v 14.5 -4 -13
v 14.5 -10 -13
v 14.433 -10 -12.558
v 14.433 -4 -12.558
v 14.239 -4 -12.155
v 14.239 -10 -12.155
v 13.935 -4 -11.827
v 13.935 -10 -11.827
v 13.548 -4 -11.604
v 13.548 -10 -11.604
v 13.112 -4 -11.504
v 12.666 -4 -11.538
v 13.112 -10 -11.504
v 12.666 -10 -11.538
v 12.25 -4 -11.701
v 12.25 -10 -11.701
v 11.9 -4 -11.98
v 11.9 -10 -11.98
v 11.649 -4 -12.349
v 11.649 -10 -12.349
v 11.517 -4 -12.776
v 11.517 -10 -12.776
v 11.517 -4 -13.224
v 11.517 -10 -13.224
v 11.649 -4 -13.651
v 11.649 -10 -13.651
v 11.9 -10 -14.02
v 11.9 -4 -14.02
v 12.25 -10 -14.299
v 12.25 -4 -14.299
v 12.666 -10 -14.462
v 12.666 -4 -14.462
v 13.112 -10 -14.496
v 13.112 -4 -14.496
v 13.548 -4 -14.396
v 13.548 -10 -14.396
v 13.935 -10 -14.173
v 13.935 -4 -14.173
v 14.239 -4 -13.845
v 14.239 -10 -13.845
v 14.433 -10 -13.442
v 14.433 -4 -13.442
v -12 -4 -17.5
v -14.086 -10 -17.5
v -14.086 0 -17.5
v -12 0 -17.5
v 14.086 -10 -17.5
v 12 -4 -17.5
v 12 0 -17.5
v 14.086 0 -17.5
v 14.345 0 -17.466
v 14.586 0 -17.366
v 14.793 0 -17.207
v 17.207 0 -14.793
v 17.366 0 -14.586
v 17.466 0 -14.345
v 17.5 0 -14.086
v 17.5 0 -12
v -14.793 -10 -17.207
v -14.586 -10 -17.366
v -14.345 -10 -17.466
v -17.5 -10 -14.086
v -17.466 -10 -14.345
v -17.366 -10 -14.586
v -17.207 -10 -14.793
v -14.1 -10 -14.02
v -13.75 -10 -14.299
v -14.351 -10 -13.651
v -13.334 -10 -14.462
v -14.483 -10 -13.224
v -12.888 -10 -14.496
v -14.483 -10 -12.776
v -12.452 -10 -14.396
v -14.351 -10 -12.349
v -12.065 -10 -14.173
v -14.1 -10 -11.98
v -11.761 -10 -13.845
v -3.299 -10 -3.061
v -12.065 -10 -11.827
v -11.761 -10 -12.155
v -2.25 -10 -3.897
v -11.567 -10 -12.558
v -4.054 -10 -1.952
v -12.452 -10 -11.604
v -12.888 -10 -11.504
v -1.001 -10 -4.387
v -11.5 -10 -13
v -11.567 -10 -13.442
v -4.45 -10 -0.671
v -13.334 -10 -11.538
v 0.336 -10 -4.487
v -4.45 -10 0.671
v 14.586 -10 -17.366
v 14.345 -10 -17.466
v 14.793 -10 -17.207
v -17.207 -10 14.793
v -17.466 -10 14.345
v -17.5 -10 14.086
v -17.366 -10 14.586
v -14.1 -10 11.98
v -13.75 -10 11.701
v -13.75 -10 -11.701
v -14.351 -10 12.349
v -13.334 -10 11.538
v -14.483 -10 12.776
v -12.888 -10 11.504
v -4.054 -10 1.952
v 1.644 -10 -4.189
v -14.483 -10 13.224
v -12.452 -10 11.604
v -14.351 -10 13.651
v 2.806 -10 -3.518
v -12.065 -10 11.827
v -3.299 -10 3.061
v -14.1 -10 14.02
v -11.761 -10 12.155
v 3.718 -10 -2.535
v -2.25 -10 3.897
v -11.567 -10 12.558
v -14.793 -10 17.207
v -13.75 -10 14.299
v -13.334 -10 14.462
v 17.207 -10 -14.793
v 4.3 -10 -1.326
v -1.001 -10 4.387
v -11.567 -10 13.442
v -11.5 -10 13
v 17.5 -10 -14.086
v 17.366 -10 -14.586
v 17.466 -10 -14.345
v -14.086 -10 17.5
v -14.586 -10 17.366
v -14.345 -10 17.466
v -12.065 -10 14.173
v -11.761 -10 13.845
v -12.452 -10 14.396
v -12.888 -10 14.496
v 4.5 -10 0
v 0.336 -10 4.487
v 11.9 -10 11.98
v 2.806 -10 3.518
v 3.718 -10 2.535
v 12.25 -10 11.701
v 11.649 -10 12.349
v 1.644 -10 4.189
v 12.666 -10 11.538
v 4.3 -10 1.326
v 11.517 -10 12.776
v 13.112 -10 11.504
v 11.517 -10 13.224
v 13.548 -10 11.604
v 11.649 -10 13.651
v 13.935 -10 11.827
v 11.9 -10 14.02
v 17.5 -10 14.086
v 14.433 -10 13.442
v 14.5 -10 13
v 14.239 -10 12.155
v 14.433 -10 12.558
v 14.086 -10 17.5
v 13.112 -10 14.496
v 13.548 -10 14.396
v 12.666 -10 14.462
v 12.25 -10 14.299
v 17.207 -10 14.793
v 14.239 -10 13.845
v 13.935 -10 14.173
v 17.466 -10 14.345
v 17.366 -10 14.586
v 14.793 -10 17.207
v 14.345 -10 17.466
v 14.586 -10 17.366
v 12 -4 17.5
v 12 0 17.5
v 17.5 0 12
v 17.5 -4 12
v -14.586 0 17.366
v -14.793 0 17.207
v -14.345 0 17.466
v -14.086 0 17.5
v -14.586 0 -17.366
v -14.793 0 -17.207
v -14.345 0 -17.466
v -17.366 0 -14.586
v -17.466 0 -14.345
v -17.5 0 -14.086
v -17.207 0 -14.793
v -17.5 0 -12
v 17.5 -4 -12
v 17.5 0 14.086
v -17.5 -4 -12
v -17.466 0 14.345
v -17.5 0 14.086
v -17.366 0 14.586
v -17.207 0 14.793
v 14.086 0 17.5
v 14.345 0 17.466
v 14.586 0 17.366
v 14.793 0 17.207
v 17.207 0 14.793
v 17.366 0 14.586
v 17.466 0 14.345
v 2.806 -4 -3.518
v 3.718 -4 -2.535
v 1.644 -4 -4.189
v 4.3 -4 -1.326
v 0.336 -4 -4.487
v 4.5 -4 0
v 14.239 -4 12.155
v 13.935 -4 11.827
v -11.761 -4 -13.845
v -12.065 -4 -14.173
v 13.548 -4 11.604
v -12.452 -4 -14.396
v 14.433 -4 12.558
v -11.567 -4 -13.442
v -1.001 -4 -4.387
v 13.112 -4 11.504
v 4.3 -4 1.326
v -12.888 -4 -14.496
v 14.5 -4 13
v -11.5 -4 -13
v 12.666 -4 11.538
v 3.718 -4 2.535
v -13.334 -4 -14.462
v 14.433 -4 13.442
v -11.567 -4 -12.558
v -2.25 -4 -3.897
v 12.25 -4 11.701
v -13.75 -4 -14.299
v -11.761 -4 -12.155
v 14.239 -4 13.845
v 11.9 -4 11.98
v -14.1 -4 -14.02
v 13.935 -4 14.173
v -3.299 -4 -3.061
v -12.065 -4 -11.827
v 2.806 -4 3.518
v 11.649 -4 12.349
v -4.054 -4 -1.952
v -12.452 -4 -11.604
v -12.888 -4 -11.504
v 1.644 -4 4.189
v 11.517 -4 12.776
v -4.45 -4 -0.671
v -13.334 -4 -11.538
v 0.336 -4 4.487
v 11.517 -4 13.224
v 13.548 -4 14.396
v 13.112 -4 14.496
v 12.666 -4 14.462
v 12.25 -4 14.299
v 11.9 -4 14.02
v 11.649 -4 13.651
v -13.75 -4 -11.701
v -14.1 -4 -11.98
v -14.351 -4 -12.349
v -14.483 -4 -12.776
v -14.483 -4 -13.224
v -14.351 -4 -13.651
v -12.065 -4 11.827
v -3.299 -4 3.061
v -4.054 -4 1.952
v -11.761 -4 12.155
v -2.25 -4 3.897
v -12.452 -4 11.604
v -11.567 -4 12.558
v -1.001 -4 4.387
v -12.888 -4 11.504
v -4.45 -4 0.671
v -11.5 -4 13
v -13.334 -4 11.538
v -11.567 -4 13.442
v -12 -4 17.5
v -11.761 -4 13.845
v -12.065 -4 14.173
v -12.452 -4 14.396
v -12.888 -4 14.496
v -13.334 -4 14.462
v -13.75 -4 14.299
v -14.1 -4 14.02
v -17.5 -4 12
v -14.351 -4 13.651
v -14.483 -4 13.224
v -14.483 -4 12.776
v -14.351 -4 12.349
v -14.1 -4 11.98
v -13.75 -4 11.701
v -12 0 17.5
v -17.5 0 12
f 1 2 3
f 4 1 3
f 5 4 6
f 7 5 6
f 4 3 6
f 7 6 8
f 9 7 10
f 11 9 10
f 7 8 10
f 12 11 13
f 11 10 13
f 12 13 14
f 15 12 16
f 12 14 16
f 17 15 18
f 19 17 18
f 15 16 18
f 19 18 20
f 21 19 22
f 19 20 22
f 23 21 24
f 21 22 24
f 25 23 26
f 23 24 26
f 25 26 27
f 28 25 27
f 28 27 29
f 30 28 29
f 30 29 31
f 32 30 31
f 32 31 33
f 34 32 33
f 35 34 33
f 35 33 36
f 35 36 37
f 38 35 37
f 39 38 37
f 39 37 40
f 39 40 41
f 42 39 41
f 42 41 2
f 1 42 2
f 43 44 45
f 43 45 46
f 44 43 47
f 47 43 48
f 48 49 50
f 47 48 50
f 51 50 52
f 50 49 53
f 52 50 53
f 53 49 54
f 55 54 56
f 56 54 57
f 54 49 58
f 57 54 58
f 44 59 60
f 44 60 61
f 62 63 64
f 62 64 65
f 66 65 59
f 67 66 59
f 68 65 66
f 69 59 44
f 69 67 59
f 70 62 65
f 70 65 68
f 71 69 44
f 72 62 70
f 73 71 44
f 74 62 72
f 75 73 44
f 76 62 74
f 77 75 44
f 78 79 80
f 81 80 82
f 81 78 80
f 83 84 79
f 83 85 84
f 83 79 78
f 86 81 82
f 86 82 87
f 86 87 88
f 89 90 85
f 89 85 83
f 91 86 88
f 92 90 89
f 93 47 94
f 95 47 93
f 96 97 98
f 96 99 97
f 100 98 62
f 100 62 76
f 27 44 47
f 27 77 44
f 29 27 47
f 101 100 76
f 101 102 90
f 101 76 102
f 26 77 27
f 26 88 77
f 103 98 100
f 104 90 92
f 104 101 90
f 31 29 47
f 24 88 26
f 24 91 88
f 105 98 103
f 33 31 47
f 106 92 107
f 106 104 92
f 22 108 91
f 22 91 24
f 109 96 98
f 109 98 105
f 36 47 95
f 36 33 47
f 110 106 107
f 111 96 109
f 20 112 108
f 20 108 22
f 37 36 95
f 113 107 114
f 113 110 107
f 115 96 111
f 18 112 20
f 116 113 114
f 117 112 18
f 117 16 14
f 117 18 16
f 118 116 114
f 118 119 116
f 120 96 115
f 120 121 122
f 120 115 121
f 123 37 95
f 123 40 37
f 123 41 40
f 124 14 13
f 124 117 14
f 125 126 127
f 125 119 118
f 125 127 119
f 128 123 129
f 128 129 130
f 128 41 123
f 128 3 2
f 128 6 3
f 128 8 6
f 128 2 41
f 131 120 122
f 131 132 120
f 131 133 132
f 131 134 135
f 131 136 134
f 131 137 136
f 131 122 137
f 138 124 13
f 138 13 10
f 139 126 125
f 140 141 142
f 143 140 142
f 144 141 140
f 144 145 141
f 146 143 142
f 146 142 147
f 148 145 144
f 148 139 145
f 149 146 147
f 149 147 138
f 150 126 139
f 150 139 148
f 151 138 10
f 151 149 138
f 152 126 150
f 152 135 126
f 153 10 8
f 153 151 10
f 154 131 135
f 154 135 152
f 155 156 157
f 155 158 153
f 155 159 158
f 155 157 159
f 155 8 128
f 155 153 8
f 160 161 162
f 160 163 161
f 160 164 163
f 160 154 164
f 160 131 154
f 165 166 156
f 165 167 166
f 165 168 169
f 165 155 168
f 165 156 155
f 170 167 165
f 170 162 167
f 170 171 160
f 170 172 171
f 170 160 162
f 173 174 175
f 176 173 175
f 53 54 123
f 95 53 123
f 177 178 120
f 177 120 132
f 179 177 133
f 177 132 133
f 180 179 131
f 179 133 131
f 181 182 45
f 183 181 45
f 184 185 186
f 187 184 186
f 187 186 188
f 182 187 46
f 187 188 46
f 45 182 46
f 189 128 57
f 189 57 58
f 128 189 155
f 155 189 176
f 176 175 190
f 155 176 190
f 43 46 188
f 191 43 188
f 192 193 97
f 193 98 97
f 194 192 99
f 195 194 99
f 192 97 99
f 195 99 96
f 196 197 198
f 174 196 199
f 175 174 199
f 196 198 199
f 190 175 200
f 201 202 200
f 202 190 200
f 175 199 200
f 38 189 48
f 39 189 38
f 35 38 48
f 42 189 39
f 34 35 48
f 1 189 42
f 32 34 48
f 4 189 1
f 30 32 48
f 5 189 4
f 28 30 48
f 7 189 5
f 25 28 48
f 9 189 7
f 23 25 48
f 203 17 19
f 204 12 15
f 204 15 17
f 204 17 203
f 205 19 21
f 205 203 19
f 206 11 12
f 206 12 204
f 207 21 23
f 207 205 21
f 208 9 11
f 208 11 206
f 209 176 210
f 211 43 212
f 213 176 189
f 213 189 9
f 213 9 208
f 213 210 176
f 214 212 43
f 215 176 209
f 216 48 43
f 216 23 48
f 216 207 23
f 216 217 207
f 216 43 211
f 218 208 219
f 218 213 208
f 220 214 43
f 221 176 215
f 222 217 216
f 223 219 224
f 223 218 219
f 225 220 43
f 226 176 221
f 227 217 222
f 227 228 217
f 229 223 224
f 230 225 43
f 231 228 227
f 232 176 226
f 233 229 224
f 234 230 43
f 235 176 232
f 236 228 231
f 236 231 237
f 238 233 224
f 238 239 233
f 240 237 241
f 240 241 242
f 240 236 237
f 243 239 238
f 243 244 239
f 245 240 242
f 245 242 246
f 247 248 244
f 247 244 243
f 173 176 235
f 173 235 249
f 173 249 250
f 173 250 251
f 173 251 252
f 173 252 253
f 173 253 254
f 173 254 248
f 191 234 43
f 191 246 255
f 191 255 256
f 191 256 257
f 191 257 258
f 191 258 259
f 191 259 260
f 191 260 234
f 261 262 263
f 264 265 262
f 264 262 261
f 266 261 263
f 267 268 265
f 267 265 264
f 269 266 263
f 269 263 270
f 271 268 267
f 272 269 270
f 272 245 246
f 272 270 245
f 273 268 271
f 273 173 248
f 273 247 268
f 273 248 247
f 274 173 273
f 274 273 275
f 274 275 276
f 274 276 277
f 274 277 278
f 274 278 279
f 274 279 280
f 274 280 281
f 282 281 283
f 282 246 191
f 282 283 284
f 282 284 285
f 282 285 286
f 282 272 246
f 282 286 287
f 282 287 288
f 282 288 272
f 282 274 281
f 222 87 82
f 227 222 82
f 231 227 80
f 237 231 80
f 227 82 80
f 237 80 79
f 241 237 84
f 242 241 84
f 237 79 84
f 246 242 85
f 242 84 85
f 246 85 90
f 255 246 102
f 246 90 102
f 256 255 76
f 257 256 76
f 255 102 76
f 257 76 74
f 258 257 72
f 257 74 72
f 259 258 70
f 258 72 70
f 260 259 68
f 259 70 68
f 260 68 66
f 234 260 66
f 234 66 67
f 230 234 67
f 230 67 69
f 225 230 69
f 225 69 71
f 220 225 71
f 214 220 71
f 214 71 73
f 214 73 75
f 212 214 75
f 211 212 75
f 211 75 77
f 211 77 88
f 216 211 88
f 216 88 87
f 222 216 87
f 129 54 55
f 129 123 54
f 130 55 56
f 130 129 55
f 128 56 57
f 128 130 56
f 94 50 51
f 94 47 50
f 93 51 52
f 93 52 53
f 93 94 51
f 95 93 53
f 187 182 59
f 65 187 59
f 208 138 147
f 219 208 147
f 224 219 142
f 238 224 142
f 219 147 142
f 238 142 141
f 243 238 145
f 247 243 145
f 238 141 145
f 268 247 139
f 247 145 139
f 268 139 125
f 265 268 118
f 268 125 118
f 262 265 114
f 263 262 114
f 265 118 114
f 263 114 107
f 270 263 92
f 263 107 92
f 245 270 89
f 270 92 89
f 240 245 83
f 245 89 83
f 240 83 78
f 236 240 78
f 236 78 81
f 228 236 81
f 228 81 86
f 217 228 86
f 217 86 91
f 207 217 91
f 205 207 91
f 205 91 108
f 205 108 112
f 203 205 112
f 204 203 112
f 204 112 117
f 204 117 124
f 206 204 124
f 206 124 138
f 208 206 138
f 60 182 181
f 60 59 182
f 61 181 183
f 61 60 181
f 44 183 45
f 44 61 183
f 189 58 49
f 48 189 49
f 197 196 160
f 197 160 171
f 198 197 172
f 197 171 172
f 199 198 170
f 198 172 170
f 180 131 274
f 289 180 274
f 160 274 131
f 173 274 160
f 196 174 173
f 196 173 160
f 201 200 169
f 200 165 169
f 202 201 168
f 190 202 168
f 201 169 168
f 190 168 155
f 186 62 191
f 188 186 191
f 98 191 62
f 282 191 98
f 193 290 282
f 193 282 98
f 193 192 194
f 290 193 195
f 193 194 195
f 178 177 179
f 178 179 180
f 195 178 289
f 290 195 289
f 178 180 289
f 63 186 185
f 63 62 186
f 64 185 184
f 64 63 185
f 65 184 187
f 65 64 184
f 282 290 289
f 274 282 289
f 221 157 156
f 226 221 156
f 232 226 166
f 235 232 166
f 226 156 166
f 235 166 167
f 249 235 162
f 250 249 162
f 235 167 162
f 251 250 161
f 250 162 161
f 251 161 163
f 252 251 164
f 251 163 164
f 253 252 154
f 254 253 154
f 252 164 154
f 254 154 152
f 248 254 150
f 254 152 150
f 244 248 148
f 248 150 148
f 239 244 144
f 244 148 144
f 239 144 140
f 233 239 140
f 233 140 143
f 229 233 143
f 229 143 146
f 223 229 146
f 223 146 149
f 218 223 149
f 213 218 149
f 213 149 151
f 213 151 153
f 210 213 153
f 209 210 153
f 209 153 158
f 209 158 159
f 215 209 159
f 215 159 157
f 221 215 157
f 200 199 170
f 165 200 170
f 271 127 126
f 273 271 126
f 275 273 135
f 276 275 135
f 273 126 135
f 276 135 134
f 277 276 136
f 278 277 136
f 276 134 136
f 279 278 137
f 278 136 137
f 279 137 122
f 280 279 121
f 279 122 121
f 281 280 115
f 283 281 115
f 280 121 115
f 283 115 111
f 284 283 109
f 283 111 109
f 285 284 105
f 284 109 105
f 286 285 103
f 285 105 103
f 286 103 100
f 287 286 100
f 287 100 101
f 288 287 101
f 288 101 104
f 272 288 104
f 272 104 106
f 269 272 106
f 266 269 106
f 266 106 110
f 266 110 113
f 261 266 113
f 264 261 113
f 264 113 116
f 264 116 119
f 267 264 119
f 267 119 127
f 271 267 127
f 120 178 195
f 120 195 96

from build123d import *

# Parameters (mm, degrees)
F0_W     = 35
F0_H     = 35
F1_DEPTH = 10
F2_SIZE  = 3
F3_R     = 1
F4_R     = 1.5
F5_DEPTH = 10.001
F6_R     = 4.5
F7_DEPTH = 10.001
F9_DEPTH = 4


with BuildPart() as f1:
    # F0 (on Front) → F1 (new body)
    with BuildSketch(Plane.XZ):
        Rectangle(F0_W, F0_H)
    extrude(amount=F1_DEPTH)

    # F2
    f2_edges = [f1.edges().sort_by_distance(p)[0] for p in [
        (-17.5, -5, 17.5),
        (17.5, -5, 17.5),
        (17.5, -5, -17.5),
        (-17.5, -5, -17.5),
    ]]
    chamfer(f2_edges, length=F2_SIZE)

    # F3
    f3_edges = [f1.edges().sort_by_distance(p)[0] for p in [
        (-14.5, -5, 17.5),
        (14.5, -5, 17.5),
        (17.5, -5, 14.5),
        (17.5, -5, -14.5),
        (14.5, -5, -17.5),
        (-14.5, -5, -17.5),
        (-17.5, -5, -14.5),
        (-17.5, -5, 14.5),
    ]]
    fillet(f3_edges, radius=F3_R)

    # F4 (on face) → F5 (cut, through all)
    with BuildSketch(Plane.XZ.offset(10)):
        with Locations((-13, 13)):
            Circle(F4_R)
        with Locations((-13, -13)):
            Circle(F4_R)
        with Locations((13, -13)):
            Circle(F4_R)
        with Locations((13, 13)):
            Circle(F4_R)
    extrude(amount=-F5_DEPTH, mode=Mode.SUBTRACT)

    # F6 (on face) → F7 (cut, through all)
    with BuildSketch(Plane.XZ.offset(10)):
        Circle(F6_R)
    extrude(amount=-F7_DEPTH, mode=Mode.SUBTRACT)

    # F8 (on face) → F9 (cut)
    with BuildSketch(Plane(origin=(0, 0, 0), x_dir=(-1, 0, 0), z_dir=(0, 1, 0))):
        Polygon((12, 17.5), (-12, 17.5), (-17.5, 12), (-17.5, -12), (-12, -17.5), (12, -17.5), (17.5, -12), (17.5, 12), align=None)
    extrude(amount=-F9_DEPTH, mode=Mode.SUBTRACT)


solid = f1.part
